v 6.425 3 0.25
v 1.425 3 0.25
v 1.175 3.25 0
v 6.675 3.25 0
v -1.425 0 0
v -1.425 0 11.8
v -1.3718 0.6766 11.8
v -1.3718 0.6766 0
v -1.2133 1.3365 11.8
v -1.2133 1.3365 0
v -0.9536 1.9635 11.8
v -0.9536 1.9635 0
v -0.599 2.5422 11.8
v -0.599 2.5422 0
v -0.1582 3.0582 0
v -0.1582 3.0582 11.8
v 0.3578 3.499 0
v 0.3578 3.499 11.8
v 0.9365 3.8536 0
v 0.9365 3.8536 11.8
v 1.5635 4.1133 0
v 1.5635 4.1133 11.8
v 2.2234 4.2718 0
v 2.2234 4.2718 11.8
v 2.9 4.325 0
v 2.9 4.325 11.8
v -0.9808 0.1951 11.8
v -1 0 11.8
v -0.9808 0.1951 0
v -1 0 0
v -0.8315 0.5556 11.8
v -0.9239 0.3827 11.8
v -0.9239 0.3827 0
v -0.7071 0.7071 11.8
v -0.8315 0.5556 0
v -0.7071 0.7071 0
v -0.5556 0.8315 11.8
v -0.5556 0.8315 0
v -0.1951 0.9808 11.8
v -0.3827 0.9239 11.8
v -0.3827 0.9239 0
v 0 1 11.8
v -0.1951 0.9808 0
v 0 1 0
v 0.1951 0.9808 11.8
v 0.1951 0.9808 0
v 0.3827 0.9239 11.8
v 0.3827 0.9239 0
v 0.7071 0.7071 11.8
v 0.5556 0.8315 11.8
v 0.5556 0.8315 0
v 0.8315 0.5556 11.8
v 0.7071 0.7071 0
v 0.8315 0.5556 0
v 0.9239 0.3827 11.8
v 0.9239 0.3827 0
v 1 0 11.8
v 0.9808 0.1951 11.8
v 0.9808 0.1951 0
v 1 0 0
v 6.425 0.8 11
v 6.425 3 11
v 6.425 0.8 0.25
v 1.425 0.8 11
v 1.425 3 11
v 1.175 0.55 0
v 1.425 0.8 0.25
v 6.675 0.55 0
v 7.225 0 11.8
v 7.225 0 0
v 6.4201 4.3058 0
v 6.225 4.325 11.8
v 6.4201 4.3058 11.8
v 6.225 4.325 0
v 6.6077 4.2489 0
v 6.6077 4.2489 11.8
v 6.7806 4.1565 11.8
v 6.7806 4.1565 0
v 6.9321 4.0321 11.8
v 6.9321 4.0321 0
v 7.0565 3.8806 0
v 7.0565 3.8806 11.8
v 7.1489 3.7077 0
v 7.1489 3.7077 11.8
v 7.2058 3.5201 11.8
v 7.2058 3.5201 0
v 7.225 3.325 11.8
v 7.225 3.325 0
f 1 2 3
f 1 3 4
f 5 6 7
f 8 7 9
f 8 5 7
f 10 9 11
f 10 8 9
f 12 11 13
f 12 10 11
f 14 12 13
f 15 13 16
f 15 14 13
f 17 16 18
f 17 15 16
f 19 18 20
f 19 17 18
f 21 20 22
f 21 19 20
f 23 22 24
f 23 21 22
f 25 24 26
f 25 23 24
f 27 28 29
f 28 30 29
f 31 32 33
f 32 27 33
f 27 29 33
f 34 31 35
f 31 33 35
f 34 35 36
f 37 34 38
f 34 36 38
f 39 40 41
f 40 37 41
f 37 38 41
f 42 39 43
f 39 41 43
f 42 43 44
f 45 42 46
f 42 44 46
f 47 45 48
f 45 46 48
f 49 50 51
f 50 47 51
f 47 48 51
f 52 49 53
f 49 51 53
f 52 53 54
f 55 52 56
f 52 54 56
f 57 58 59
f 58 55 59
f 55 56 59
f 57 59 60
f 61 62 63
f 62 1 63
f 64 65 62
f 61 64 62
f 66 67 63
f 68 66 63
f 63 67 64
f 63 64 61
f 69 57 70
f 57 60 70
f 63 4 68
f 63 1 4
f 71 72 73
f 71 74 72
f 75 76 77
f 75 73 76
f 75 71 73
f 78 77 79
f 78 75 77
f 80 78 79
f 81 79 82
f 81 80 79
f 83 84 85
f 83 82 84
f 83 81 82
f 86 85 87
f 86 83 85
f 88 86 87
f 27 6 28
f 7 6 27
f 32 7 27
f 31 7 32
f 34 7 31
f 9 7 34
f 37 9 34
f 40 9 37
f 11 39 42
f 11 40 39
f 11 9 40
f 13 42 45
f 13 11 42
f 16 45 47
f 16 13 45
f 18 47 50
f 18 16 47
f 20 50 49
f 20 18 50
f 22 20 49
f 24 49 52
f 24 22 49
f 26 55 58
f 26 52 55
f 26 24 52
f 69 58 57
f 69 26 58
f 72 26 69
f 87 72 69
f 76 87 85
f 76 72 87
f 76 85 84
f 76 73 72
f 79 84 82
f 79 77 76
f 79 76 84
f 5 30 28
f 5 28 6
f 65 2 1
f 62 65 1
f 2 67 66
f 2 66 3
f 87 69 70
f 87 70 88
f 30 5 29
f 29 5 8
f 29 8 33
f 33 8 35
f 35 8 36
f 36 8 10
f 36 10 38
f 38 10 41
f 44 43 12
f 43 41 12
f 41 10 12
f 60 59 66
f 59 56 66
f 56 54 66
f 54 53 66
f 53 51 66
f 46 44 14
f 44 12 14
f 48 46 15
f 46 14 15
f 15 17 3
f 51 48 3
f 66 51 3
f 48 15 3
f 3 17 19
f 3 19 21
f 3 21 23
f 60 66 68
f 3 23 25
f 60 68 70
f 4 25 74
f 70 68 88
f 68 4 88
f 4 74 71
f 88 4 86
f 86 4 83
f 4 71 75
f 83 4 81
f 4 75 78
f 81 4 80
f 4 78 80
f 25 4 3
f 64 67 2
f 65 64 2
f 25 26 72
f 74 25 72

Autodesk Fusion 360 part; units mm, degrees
sketch "antenna_nupsi" plane through (0, 0, 0) normal (0, 0, 1) x (1, 0, 0)
  line L0 (0, 0) -> (0.625, 0)
  line L1 (0.625, 0) -> (1.425, 0)
  line L2 (1.425, 0) -> (6.425, 0)
  line L3 (6.425, 0) -> (7.225, 0)
  line L4 (0, 0) -> (-0.625, 0)
  line L5 (-0.625, 0) -> (-1.425, 0)
  arc A0 (2.9, 4.325) -> (-1.425, 0) centre (2.9, 0) ccw
  line L6 (1.425, 0.8) -> (1.425, 3)
  line L7 (1.425, 3) -> (6.425, 3)
  line L8 (6.425, 3) -> (6.425, 0.8)
  line L9 (2.9, 4.325) -> (6.225, 4.325)
  line L10 (7.225, 0) -> (7.225, 3.325)
  line L11 (1.425, 0.8) -> (6.425, 0.8)
  arc A1 (0.625, 0) -> (-0.625, 0) centre (0, 0) ccw
  arc A2 (1, 0) -> (-1, 0) centre (0, 0) ccw
  arc A3 (7.225, 3.325) -> (6.225, 4.325) centre (6.225, 3.325) ccw
  dimension "d1" = 1.25
  dimension "d2" = 0.8
  dimension "d5" = 0.8
  dimension "d7" = 0.8
  dimension "d8" = 2.2
  dimension "d19" = 2
  dimension "d20" = 5
extrude "Extrude5" add sketch "antenna_nupsi" along normal blind 11 contours L1 L2 L3 L5 A0 L9 L10 A2 A3 makes body 1
extrude "Extrude6" add sketch "antenna_nupsi" along normal blind 0.8 separate body contours L1 L2 L3 L5 A0 L9 L10 A2 A3 | L6 L7 L8 L11 makes body 2
move_body "Move1" bodies 2 to x (1, 0, 0) y (0, 1, 0) z (0, 0, 1) at (0, 0, 11)
combine "Combine2" operation add target body 1 tool bodies 2
chamfer "Chamfer2" distance 0.25 angle 45 4 edges at (1.425, 1.9, 0) (3.925, 0.8, 0) (6.425, 1.9, 0) (3.925, 3, 0) on bodies 1
